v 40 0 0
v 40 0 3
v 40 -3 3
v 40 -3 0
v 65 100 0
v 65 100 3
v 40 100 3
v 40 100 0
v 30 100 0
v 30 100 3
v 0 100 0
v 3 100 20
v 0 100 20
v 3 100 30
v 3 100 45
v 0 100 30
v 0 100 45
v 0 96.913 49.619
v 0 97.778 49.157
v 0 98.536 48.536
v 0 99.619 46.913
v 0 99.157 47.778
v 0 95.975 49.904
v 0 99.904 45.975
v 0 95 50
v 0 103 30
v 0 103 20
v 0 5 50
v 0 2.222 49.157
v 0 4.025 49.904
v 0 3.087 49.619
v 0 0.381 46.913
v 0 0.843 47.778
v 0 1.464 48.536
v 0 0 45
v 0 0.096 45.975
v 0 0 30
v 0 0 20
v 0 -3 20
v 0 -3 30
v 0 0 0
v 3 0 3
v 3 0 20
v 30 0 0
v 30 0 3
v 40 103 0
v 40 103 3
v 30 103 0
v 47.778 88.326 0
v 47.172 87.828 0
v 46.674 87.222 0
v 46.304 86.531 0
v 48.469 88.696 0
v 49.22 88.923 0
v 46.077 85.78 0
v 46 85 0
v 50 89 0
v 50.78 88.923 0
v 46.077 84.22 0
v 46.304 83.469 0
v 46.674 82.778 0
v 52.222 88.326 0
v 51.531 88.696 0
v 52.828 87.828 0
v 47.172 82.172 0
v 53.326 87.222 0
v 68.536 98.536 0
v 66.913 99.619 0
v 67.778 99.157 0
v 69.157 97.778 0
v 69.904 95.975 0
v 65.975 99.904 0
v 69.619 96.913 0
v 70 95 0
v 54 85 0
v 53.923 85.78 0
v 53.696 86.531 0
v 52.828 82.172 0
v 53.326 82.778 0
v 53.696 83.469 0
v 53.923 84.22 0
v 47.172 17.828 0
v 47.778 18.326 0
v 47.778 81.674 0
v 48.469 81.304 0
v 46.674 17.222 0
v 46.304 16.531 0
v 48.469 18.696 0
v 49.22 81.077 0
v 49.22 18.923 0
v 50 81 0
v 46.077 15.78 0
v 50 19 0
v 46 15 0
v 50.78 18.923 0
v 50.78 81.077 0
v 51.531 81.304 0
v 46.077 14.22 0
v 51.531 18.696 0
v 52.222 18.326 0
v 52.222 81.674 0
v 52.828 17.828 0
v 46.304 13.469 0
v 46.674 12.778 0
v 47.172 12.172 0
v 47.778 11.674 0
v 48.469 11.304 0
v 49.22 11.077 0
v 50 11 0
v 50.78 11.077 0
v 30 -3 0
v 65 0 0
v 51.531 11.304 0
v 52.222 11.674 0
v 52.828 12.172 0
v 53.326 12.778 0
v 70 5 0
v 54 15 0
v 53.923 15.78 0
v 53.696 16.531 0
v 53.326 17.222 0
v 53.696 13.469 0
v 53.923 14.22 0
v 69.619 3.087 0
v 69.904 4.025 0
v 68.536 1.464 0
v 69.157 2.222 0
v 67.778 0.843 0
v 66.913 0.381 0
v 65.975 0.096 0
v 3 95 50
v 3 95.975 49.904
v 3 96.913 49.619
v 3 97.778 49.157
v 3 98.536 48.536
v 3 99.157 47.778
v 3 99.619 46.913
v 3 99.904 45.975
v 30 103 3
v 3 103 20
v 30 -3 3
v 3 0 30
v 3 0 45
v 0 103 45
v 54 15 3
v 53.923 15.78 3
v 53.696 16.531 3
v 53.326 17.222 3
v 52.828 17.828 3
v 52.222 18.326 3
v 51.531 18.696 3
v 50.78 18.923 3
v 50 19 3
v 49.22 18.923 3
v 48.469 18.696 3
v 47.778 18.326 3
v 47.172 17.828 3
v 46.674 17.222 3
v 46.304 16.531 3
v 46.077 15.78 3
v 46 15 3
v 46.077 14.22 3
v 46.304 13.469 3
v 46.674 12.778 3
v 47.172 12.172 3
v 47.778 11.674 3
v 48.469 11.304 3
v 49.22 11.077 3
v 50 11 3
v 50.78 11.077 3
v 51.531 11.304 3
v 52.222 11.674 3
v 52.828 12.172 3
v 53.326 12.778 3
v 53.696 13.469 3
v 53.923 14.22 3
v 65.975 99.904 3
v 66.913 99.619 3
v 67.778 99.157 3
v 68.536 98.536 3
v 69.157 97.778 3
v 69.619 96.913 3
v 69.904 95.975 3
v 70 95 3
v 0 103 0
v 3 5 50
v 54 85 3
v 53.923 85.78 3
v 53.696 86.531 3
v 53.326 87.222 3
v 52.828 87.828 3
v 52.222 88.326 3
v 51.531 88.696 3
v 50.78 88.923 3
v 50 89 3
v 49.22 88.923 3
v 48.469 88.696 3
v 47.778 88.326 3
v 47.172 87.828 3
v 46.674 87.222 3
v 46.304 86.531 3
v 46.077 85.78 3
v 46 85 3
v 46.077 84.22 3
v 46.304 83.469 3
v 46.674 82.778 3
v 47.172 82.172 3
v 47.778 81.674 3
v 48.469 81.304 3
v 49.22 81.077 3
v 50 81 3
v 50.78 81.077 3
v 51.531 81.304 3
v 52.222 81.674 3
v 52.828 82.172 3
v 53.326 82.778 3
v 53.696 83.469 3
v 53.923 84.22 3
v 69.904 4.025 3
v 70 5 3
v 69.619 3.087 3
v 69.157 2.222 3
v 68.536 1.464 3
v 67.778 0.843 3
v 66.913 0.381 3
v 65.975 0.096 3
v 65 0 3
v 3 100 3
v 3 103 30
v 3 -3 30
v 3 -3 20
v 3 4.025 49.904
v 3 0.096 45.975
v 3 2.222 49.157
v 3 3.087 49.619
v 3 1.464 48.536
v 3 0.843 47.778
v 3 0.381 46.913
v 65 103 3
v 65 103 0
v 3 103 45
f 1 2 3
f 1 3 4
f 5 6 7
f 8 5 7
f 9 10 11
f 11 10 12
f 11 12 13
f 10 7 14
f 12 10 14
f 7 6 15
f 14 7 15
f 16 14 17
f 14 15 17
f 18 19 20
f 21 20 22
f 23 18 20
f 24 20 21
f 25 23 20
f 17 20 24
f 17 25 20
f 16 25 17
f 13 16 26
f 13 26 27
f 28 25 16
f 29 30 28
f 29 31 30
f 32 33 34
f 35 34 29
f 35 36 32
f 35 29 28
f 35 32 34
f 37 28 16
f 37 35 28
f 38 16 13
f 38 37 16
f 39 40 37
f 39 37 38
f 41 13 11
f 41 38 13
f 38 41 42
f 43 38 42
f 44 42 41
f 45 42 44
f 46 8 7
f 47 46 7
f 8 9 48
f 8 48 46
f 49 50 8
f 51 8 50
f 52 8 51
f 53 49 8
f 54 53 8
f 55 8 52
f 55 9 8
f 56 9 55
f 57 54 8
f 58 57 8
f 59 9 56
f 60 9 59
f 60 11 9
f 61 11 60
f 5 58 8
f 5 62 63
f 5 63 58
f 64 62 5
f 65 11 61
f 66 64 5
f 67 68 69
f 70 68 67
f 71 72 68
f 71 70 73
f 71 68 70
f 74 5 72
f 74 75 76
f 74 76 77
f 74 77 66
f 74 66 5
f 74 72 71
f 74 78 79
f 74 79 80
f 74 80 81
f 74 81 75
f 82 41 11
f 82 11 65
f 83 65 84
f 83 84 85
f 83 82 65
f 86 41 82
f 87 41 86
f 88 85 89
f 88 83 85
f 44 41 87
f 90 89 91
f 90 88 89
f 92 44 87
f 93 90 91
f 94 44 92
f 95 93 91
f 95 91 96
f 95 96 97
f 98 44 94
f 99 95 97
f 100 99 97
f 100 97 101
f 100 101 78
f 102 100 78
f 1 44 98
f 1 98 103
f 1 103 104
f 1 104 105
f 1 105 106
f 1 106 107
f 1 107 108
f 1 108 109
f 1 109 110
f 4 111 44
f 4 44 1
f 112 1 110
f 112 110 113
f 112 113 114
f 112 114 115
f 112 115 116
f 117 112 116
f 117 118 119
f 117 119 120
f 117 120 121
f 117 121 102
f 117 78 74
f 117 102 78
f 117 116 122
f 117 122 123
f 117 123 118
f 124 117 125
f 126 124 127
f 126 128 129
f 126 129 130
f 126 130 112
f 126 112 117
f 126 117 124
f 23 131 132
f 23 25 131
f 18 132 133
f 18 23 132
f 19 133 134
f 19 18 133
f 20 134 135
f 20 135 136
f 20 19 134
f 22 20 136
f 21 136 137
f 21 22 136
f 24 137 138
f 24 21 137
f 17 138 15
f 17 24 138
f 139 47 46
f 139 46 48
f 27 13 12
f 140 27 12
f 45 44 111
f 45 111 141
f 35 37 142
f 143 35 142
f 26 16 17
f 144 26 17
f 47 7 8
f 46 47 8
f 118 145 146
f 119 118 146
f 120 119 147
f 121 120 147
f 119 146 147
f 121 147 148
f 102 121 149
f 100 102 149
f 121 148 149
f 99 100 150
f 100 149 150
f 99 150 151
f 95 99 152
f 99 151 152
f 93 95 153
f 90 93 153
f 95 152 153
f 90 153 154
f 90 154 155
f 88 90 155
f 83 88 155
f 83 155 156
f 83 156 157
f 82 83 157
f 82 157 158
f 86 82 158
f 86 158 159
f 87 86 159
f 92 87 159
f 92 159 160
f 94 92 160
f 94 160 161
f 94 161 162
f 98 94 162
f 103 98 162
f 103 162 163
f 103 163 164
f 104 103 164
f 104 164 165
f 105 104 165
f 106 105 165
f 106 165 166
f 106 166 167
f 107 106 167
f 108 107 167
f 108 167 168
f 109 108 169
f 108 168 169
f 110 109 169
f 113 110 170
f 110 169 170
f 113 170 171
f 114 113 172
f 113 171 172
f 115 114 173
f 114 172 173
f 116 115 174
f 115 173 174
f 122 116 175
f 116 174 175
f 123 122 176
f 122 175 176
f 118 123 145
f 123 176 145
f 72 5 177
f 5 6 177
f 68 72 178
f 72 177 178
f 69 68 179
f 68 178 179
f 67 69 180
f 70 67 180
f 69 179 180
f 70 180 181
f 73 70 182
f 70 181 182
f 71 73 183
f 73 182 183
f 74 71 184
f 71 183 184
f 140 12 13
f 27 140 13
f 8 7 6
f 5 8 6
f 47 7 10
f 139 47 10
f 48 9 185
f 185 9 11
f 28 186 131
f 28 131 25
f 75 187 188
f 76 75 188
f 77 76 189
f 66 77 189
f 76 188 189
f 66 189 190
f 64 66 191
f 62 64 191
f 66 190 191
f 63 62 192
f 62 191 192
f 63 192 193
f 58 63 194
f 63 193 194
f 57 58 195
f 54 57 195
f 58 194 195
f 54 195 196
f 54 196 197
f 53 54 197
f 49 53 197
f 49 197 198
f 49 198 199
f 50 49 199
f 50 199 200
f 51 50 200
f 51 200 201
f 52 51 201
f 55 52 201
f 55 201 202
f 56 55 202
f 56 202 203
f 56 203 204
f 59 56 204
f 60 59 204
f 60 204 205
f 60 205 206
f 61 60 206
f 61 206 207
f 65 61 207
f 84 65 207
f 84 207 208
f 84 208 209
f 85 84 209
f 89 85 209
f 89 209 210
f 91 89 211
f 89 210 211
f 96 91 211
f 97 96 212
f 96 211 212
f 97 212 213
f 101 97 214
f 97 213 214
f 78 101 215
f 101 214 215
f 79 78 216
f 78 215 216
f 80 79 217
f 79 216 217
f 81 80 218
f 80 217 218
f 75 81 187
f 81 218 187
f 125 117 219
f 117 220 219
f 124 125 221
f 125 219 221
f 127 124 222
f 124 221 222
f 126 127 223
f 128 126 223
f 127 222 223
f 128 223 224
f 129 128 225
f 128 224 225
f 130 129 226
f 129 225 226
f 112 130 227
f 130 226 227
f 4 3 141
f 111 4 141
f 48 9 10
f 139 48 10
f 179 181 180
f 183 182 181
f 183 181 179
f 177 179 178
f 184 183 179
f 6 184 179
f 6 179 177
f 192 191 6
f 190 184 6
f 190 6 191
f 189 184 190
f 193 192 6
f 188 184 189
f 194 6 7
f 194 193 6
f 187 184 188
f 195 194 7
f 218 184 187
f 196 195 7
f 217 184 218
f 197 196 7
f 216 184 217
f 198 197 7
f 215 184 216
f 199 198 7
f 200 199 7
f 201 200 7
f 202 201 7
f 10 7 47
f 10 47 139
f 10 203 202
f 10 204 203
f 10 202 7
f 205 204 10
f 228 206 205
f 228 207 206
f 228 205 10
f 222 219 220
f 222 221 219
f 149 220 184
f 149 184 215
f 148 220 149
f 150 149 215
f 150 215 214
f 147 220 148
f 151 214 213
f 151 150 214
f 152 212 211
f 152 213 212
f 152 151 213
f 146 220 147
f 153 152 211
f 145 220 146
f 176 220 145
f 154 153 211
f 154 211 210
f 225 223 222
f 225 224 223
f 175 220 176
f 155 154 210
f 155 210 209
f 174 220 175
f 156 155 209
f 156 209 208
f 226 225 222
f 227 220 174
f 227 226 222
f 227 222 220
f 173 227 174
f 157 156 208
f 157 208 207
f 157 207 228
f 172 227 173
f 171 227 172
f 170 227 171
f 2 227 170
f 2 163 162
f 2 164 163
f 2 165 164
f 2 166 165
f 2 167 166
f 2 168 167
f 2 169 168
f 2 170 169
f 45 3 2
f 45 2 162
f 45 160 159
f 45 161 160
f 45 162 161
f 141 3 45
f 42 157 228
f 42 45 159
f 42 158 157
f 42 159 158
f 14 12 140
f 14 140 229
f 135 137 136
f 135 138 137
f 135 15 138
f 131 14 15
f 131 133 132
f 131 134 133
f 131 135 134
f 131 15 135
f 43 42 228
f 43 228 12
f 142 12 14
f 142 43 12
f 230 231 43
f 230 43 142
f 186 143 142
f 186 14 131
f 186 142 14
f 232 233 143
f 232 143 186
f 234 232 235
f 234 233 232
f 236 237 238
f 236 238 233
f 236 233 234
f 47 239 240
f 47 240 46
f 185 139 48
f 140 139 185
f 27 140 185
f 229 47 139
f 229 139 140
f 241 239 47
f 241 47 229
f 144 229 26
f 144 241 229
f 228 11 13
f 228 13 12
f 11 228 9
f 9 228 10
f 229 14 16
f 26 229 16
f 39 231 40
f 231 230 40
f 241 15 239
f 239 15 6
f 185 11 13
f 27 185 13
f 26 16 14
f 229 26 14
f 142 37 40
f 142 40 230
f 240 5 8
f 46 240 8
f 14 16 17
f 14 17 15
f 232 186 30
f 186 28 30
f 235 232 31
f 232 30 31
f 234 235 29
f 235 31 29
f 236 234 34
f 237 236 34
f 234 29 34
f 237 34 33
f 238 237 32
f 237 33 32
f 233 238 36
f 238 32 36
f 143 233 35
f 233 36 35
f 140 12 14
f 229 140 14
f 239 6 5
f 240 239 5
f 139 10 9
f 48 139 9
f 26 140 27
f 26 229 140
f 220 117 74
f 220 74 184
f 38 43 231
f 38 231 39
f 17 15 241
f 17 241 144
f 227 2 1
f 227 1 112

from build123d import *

# Parameters (mm, degrees)
F1_DEPTH = 100
F2_R     = 4
F3_DEPTH = 25
F5_DEPTH = 3
F7_R     = 5
F8_W     = 3
F8_H     = 15
F9_DEPTH = 3


# Not quite as in the source:
# - a pattern or mirror of a feature is missing from the dataset's text; its kind, count and spacing are read off the source's solid


with BuildPart() as f1:
    # F0 (on Front) → F1 (new body)
    with BuildSketch(Plane.XZ):
        Polygon((0, 50), (0, 0), (70, 0), (70, 3), (3, 3), (3, 50), align=None)
    extrude(amount=-F1_DEPTH)

    # F2 (on face) → F3 (cut)
    with BuildSketch(Plane.XY.offset(3)):
        with Locations((50, 85)):
            Circle(F2_R)
        with Locations((50, 15)):
            Circle(F2_R)
    extrude(amount=-F3_DEPTH, mode=Mode.SUBTRACT)

    # F4 (on face) → F5 (join)
    with BuildSketch(Plane(origin=(0, 100, 0), x_dir=(-1, 0, 0), z_dir=(0, 1, 0))):
        Polygon((-3, 20), (0, 20), (0, 25), (0, 30), (-3, 30), align=None)
        Polygon((-35, 0), (-30, 0), (-30, 3), (-40, 3), (-40, 0), align=None)
    f5 = extrude(amount=F5_DEPTH)

    # F5_copies: F5 across plane
    add(f5.mirror(Plane(origin=(0, 50, 0), x_dir=(0, 0, -1), z_dir=(0, -1, 0))))

    # F7
    f7_edges = [f1.edges().sort_by_distance(p)[0] for p in [
        (1.5, 100, 50),
        (1.5, 0, 50),
        (70, 100, 1.5),
        (70, 0, 1.5),
    ]]
    fillet(f7_edges, radius=F7_R)


with BuildPart() as f9:
    # F8 (on face) → F9 (new body)
    with BuildSketch(Plane(origin=(0, 100, 0), x_dir=(-1, 0, 0), z_dir=(0, 1, 0))):
        Polygon((-3, 20), (-3, 30), (-3, 45), (-65, 3), (-65, 0), (-40, 0), (-40, 3), (-30, 3), (-3, 3), align=None)
        Polygon((0, 20), (-3, 20), (-3, 3), (-30, 3), (-30, 0), (0, 0), align=None)
        with Locations((-1.5, 37.5)):
            Rectangle(F8_W, F8_H)
    extrude(amount=F9_DEPTH)


solid = Compound([f1.part, f9.part])
